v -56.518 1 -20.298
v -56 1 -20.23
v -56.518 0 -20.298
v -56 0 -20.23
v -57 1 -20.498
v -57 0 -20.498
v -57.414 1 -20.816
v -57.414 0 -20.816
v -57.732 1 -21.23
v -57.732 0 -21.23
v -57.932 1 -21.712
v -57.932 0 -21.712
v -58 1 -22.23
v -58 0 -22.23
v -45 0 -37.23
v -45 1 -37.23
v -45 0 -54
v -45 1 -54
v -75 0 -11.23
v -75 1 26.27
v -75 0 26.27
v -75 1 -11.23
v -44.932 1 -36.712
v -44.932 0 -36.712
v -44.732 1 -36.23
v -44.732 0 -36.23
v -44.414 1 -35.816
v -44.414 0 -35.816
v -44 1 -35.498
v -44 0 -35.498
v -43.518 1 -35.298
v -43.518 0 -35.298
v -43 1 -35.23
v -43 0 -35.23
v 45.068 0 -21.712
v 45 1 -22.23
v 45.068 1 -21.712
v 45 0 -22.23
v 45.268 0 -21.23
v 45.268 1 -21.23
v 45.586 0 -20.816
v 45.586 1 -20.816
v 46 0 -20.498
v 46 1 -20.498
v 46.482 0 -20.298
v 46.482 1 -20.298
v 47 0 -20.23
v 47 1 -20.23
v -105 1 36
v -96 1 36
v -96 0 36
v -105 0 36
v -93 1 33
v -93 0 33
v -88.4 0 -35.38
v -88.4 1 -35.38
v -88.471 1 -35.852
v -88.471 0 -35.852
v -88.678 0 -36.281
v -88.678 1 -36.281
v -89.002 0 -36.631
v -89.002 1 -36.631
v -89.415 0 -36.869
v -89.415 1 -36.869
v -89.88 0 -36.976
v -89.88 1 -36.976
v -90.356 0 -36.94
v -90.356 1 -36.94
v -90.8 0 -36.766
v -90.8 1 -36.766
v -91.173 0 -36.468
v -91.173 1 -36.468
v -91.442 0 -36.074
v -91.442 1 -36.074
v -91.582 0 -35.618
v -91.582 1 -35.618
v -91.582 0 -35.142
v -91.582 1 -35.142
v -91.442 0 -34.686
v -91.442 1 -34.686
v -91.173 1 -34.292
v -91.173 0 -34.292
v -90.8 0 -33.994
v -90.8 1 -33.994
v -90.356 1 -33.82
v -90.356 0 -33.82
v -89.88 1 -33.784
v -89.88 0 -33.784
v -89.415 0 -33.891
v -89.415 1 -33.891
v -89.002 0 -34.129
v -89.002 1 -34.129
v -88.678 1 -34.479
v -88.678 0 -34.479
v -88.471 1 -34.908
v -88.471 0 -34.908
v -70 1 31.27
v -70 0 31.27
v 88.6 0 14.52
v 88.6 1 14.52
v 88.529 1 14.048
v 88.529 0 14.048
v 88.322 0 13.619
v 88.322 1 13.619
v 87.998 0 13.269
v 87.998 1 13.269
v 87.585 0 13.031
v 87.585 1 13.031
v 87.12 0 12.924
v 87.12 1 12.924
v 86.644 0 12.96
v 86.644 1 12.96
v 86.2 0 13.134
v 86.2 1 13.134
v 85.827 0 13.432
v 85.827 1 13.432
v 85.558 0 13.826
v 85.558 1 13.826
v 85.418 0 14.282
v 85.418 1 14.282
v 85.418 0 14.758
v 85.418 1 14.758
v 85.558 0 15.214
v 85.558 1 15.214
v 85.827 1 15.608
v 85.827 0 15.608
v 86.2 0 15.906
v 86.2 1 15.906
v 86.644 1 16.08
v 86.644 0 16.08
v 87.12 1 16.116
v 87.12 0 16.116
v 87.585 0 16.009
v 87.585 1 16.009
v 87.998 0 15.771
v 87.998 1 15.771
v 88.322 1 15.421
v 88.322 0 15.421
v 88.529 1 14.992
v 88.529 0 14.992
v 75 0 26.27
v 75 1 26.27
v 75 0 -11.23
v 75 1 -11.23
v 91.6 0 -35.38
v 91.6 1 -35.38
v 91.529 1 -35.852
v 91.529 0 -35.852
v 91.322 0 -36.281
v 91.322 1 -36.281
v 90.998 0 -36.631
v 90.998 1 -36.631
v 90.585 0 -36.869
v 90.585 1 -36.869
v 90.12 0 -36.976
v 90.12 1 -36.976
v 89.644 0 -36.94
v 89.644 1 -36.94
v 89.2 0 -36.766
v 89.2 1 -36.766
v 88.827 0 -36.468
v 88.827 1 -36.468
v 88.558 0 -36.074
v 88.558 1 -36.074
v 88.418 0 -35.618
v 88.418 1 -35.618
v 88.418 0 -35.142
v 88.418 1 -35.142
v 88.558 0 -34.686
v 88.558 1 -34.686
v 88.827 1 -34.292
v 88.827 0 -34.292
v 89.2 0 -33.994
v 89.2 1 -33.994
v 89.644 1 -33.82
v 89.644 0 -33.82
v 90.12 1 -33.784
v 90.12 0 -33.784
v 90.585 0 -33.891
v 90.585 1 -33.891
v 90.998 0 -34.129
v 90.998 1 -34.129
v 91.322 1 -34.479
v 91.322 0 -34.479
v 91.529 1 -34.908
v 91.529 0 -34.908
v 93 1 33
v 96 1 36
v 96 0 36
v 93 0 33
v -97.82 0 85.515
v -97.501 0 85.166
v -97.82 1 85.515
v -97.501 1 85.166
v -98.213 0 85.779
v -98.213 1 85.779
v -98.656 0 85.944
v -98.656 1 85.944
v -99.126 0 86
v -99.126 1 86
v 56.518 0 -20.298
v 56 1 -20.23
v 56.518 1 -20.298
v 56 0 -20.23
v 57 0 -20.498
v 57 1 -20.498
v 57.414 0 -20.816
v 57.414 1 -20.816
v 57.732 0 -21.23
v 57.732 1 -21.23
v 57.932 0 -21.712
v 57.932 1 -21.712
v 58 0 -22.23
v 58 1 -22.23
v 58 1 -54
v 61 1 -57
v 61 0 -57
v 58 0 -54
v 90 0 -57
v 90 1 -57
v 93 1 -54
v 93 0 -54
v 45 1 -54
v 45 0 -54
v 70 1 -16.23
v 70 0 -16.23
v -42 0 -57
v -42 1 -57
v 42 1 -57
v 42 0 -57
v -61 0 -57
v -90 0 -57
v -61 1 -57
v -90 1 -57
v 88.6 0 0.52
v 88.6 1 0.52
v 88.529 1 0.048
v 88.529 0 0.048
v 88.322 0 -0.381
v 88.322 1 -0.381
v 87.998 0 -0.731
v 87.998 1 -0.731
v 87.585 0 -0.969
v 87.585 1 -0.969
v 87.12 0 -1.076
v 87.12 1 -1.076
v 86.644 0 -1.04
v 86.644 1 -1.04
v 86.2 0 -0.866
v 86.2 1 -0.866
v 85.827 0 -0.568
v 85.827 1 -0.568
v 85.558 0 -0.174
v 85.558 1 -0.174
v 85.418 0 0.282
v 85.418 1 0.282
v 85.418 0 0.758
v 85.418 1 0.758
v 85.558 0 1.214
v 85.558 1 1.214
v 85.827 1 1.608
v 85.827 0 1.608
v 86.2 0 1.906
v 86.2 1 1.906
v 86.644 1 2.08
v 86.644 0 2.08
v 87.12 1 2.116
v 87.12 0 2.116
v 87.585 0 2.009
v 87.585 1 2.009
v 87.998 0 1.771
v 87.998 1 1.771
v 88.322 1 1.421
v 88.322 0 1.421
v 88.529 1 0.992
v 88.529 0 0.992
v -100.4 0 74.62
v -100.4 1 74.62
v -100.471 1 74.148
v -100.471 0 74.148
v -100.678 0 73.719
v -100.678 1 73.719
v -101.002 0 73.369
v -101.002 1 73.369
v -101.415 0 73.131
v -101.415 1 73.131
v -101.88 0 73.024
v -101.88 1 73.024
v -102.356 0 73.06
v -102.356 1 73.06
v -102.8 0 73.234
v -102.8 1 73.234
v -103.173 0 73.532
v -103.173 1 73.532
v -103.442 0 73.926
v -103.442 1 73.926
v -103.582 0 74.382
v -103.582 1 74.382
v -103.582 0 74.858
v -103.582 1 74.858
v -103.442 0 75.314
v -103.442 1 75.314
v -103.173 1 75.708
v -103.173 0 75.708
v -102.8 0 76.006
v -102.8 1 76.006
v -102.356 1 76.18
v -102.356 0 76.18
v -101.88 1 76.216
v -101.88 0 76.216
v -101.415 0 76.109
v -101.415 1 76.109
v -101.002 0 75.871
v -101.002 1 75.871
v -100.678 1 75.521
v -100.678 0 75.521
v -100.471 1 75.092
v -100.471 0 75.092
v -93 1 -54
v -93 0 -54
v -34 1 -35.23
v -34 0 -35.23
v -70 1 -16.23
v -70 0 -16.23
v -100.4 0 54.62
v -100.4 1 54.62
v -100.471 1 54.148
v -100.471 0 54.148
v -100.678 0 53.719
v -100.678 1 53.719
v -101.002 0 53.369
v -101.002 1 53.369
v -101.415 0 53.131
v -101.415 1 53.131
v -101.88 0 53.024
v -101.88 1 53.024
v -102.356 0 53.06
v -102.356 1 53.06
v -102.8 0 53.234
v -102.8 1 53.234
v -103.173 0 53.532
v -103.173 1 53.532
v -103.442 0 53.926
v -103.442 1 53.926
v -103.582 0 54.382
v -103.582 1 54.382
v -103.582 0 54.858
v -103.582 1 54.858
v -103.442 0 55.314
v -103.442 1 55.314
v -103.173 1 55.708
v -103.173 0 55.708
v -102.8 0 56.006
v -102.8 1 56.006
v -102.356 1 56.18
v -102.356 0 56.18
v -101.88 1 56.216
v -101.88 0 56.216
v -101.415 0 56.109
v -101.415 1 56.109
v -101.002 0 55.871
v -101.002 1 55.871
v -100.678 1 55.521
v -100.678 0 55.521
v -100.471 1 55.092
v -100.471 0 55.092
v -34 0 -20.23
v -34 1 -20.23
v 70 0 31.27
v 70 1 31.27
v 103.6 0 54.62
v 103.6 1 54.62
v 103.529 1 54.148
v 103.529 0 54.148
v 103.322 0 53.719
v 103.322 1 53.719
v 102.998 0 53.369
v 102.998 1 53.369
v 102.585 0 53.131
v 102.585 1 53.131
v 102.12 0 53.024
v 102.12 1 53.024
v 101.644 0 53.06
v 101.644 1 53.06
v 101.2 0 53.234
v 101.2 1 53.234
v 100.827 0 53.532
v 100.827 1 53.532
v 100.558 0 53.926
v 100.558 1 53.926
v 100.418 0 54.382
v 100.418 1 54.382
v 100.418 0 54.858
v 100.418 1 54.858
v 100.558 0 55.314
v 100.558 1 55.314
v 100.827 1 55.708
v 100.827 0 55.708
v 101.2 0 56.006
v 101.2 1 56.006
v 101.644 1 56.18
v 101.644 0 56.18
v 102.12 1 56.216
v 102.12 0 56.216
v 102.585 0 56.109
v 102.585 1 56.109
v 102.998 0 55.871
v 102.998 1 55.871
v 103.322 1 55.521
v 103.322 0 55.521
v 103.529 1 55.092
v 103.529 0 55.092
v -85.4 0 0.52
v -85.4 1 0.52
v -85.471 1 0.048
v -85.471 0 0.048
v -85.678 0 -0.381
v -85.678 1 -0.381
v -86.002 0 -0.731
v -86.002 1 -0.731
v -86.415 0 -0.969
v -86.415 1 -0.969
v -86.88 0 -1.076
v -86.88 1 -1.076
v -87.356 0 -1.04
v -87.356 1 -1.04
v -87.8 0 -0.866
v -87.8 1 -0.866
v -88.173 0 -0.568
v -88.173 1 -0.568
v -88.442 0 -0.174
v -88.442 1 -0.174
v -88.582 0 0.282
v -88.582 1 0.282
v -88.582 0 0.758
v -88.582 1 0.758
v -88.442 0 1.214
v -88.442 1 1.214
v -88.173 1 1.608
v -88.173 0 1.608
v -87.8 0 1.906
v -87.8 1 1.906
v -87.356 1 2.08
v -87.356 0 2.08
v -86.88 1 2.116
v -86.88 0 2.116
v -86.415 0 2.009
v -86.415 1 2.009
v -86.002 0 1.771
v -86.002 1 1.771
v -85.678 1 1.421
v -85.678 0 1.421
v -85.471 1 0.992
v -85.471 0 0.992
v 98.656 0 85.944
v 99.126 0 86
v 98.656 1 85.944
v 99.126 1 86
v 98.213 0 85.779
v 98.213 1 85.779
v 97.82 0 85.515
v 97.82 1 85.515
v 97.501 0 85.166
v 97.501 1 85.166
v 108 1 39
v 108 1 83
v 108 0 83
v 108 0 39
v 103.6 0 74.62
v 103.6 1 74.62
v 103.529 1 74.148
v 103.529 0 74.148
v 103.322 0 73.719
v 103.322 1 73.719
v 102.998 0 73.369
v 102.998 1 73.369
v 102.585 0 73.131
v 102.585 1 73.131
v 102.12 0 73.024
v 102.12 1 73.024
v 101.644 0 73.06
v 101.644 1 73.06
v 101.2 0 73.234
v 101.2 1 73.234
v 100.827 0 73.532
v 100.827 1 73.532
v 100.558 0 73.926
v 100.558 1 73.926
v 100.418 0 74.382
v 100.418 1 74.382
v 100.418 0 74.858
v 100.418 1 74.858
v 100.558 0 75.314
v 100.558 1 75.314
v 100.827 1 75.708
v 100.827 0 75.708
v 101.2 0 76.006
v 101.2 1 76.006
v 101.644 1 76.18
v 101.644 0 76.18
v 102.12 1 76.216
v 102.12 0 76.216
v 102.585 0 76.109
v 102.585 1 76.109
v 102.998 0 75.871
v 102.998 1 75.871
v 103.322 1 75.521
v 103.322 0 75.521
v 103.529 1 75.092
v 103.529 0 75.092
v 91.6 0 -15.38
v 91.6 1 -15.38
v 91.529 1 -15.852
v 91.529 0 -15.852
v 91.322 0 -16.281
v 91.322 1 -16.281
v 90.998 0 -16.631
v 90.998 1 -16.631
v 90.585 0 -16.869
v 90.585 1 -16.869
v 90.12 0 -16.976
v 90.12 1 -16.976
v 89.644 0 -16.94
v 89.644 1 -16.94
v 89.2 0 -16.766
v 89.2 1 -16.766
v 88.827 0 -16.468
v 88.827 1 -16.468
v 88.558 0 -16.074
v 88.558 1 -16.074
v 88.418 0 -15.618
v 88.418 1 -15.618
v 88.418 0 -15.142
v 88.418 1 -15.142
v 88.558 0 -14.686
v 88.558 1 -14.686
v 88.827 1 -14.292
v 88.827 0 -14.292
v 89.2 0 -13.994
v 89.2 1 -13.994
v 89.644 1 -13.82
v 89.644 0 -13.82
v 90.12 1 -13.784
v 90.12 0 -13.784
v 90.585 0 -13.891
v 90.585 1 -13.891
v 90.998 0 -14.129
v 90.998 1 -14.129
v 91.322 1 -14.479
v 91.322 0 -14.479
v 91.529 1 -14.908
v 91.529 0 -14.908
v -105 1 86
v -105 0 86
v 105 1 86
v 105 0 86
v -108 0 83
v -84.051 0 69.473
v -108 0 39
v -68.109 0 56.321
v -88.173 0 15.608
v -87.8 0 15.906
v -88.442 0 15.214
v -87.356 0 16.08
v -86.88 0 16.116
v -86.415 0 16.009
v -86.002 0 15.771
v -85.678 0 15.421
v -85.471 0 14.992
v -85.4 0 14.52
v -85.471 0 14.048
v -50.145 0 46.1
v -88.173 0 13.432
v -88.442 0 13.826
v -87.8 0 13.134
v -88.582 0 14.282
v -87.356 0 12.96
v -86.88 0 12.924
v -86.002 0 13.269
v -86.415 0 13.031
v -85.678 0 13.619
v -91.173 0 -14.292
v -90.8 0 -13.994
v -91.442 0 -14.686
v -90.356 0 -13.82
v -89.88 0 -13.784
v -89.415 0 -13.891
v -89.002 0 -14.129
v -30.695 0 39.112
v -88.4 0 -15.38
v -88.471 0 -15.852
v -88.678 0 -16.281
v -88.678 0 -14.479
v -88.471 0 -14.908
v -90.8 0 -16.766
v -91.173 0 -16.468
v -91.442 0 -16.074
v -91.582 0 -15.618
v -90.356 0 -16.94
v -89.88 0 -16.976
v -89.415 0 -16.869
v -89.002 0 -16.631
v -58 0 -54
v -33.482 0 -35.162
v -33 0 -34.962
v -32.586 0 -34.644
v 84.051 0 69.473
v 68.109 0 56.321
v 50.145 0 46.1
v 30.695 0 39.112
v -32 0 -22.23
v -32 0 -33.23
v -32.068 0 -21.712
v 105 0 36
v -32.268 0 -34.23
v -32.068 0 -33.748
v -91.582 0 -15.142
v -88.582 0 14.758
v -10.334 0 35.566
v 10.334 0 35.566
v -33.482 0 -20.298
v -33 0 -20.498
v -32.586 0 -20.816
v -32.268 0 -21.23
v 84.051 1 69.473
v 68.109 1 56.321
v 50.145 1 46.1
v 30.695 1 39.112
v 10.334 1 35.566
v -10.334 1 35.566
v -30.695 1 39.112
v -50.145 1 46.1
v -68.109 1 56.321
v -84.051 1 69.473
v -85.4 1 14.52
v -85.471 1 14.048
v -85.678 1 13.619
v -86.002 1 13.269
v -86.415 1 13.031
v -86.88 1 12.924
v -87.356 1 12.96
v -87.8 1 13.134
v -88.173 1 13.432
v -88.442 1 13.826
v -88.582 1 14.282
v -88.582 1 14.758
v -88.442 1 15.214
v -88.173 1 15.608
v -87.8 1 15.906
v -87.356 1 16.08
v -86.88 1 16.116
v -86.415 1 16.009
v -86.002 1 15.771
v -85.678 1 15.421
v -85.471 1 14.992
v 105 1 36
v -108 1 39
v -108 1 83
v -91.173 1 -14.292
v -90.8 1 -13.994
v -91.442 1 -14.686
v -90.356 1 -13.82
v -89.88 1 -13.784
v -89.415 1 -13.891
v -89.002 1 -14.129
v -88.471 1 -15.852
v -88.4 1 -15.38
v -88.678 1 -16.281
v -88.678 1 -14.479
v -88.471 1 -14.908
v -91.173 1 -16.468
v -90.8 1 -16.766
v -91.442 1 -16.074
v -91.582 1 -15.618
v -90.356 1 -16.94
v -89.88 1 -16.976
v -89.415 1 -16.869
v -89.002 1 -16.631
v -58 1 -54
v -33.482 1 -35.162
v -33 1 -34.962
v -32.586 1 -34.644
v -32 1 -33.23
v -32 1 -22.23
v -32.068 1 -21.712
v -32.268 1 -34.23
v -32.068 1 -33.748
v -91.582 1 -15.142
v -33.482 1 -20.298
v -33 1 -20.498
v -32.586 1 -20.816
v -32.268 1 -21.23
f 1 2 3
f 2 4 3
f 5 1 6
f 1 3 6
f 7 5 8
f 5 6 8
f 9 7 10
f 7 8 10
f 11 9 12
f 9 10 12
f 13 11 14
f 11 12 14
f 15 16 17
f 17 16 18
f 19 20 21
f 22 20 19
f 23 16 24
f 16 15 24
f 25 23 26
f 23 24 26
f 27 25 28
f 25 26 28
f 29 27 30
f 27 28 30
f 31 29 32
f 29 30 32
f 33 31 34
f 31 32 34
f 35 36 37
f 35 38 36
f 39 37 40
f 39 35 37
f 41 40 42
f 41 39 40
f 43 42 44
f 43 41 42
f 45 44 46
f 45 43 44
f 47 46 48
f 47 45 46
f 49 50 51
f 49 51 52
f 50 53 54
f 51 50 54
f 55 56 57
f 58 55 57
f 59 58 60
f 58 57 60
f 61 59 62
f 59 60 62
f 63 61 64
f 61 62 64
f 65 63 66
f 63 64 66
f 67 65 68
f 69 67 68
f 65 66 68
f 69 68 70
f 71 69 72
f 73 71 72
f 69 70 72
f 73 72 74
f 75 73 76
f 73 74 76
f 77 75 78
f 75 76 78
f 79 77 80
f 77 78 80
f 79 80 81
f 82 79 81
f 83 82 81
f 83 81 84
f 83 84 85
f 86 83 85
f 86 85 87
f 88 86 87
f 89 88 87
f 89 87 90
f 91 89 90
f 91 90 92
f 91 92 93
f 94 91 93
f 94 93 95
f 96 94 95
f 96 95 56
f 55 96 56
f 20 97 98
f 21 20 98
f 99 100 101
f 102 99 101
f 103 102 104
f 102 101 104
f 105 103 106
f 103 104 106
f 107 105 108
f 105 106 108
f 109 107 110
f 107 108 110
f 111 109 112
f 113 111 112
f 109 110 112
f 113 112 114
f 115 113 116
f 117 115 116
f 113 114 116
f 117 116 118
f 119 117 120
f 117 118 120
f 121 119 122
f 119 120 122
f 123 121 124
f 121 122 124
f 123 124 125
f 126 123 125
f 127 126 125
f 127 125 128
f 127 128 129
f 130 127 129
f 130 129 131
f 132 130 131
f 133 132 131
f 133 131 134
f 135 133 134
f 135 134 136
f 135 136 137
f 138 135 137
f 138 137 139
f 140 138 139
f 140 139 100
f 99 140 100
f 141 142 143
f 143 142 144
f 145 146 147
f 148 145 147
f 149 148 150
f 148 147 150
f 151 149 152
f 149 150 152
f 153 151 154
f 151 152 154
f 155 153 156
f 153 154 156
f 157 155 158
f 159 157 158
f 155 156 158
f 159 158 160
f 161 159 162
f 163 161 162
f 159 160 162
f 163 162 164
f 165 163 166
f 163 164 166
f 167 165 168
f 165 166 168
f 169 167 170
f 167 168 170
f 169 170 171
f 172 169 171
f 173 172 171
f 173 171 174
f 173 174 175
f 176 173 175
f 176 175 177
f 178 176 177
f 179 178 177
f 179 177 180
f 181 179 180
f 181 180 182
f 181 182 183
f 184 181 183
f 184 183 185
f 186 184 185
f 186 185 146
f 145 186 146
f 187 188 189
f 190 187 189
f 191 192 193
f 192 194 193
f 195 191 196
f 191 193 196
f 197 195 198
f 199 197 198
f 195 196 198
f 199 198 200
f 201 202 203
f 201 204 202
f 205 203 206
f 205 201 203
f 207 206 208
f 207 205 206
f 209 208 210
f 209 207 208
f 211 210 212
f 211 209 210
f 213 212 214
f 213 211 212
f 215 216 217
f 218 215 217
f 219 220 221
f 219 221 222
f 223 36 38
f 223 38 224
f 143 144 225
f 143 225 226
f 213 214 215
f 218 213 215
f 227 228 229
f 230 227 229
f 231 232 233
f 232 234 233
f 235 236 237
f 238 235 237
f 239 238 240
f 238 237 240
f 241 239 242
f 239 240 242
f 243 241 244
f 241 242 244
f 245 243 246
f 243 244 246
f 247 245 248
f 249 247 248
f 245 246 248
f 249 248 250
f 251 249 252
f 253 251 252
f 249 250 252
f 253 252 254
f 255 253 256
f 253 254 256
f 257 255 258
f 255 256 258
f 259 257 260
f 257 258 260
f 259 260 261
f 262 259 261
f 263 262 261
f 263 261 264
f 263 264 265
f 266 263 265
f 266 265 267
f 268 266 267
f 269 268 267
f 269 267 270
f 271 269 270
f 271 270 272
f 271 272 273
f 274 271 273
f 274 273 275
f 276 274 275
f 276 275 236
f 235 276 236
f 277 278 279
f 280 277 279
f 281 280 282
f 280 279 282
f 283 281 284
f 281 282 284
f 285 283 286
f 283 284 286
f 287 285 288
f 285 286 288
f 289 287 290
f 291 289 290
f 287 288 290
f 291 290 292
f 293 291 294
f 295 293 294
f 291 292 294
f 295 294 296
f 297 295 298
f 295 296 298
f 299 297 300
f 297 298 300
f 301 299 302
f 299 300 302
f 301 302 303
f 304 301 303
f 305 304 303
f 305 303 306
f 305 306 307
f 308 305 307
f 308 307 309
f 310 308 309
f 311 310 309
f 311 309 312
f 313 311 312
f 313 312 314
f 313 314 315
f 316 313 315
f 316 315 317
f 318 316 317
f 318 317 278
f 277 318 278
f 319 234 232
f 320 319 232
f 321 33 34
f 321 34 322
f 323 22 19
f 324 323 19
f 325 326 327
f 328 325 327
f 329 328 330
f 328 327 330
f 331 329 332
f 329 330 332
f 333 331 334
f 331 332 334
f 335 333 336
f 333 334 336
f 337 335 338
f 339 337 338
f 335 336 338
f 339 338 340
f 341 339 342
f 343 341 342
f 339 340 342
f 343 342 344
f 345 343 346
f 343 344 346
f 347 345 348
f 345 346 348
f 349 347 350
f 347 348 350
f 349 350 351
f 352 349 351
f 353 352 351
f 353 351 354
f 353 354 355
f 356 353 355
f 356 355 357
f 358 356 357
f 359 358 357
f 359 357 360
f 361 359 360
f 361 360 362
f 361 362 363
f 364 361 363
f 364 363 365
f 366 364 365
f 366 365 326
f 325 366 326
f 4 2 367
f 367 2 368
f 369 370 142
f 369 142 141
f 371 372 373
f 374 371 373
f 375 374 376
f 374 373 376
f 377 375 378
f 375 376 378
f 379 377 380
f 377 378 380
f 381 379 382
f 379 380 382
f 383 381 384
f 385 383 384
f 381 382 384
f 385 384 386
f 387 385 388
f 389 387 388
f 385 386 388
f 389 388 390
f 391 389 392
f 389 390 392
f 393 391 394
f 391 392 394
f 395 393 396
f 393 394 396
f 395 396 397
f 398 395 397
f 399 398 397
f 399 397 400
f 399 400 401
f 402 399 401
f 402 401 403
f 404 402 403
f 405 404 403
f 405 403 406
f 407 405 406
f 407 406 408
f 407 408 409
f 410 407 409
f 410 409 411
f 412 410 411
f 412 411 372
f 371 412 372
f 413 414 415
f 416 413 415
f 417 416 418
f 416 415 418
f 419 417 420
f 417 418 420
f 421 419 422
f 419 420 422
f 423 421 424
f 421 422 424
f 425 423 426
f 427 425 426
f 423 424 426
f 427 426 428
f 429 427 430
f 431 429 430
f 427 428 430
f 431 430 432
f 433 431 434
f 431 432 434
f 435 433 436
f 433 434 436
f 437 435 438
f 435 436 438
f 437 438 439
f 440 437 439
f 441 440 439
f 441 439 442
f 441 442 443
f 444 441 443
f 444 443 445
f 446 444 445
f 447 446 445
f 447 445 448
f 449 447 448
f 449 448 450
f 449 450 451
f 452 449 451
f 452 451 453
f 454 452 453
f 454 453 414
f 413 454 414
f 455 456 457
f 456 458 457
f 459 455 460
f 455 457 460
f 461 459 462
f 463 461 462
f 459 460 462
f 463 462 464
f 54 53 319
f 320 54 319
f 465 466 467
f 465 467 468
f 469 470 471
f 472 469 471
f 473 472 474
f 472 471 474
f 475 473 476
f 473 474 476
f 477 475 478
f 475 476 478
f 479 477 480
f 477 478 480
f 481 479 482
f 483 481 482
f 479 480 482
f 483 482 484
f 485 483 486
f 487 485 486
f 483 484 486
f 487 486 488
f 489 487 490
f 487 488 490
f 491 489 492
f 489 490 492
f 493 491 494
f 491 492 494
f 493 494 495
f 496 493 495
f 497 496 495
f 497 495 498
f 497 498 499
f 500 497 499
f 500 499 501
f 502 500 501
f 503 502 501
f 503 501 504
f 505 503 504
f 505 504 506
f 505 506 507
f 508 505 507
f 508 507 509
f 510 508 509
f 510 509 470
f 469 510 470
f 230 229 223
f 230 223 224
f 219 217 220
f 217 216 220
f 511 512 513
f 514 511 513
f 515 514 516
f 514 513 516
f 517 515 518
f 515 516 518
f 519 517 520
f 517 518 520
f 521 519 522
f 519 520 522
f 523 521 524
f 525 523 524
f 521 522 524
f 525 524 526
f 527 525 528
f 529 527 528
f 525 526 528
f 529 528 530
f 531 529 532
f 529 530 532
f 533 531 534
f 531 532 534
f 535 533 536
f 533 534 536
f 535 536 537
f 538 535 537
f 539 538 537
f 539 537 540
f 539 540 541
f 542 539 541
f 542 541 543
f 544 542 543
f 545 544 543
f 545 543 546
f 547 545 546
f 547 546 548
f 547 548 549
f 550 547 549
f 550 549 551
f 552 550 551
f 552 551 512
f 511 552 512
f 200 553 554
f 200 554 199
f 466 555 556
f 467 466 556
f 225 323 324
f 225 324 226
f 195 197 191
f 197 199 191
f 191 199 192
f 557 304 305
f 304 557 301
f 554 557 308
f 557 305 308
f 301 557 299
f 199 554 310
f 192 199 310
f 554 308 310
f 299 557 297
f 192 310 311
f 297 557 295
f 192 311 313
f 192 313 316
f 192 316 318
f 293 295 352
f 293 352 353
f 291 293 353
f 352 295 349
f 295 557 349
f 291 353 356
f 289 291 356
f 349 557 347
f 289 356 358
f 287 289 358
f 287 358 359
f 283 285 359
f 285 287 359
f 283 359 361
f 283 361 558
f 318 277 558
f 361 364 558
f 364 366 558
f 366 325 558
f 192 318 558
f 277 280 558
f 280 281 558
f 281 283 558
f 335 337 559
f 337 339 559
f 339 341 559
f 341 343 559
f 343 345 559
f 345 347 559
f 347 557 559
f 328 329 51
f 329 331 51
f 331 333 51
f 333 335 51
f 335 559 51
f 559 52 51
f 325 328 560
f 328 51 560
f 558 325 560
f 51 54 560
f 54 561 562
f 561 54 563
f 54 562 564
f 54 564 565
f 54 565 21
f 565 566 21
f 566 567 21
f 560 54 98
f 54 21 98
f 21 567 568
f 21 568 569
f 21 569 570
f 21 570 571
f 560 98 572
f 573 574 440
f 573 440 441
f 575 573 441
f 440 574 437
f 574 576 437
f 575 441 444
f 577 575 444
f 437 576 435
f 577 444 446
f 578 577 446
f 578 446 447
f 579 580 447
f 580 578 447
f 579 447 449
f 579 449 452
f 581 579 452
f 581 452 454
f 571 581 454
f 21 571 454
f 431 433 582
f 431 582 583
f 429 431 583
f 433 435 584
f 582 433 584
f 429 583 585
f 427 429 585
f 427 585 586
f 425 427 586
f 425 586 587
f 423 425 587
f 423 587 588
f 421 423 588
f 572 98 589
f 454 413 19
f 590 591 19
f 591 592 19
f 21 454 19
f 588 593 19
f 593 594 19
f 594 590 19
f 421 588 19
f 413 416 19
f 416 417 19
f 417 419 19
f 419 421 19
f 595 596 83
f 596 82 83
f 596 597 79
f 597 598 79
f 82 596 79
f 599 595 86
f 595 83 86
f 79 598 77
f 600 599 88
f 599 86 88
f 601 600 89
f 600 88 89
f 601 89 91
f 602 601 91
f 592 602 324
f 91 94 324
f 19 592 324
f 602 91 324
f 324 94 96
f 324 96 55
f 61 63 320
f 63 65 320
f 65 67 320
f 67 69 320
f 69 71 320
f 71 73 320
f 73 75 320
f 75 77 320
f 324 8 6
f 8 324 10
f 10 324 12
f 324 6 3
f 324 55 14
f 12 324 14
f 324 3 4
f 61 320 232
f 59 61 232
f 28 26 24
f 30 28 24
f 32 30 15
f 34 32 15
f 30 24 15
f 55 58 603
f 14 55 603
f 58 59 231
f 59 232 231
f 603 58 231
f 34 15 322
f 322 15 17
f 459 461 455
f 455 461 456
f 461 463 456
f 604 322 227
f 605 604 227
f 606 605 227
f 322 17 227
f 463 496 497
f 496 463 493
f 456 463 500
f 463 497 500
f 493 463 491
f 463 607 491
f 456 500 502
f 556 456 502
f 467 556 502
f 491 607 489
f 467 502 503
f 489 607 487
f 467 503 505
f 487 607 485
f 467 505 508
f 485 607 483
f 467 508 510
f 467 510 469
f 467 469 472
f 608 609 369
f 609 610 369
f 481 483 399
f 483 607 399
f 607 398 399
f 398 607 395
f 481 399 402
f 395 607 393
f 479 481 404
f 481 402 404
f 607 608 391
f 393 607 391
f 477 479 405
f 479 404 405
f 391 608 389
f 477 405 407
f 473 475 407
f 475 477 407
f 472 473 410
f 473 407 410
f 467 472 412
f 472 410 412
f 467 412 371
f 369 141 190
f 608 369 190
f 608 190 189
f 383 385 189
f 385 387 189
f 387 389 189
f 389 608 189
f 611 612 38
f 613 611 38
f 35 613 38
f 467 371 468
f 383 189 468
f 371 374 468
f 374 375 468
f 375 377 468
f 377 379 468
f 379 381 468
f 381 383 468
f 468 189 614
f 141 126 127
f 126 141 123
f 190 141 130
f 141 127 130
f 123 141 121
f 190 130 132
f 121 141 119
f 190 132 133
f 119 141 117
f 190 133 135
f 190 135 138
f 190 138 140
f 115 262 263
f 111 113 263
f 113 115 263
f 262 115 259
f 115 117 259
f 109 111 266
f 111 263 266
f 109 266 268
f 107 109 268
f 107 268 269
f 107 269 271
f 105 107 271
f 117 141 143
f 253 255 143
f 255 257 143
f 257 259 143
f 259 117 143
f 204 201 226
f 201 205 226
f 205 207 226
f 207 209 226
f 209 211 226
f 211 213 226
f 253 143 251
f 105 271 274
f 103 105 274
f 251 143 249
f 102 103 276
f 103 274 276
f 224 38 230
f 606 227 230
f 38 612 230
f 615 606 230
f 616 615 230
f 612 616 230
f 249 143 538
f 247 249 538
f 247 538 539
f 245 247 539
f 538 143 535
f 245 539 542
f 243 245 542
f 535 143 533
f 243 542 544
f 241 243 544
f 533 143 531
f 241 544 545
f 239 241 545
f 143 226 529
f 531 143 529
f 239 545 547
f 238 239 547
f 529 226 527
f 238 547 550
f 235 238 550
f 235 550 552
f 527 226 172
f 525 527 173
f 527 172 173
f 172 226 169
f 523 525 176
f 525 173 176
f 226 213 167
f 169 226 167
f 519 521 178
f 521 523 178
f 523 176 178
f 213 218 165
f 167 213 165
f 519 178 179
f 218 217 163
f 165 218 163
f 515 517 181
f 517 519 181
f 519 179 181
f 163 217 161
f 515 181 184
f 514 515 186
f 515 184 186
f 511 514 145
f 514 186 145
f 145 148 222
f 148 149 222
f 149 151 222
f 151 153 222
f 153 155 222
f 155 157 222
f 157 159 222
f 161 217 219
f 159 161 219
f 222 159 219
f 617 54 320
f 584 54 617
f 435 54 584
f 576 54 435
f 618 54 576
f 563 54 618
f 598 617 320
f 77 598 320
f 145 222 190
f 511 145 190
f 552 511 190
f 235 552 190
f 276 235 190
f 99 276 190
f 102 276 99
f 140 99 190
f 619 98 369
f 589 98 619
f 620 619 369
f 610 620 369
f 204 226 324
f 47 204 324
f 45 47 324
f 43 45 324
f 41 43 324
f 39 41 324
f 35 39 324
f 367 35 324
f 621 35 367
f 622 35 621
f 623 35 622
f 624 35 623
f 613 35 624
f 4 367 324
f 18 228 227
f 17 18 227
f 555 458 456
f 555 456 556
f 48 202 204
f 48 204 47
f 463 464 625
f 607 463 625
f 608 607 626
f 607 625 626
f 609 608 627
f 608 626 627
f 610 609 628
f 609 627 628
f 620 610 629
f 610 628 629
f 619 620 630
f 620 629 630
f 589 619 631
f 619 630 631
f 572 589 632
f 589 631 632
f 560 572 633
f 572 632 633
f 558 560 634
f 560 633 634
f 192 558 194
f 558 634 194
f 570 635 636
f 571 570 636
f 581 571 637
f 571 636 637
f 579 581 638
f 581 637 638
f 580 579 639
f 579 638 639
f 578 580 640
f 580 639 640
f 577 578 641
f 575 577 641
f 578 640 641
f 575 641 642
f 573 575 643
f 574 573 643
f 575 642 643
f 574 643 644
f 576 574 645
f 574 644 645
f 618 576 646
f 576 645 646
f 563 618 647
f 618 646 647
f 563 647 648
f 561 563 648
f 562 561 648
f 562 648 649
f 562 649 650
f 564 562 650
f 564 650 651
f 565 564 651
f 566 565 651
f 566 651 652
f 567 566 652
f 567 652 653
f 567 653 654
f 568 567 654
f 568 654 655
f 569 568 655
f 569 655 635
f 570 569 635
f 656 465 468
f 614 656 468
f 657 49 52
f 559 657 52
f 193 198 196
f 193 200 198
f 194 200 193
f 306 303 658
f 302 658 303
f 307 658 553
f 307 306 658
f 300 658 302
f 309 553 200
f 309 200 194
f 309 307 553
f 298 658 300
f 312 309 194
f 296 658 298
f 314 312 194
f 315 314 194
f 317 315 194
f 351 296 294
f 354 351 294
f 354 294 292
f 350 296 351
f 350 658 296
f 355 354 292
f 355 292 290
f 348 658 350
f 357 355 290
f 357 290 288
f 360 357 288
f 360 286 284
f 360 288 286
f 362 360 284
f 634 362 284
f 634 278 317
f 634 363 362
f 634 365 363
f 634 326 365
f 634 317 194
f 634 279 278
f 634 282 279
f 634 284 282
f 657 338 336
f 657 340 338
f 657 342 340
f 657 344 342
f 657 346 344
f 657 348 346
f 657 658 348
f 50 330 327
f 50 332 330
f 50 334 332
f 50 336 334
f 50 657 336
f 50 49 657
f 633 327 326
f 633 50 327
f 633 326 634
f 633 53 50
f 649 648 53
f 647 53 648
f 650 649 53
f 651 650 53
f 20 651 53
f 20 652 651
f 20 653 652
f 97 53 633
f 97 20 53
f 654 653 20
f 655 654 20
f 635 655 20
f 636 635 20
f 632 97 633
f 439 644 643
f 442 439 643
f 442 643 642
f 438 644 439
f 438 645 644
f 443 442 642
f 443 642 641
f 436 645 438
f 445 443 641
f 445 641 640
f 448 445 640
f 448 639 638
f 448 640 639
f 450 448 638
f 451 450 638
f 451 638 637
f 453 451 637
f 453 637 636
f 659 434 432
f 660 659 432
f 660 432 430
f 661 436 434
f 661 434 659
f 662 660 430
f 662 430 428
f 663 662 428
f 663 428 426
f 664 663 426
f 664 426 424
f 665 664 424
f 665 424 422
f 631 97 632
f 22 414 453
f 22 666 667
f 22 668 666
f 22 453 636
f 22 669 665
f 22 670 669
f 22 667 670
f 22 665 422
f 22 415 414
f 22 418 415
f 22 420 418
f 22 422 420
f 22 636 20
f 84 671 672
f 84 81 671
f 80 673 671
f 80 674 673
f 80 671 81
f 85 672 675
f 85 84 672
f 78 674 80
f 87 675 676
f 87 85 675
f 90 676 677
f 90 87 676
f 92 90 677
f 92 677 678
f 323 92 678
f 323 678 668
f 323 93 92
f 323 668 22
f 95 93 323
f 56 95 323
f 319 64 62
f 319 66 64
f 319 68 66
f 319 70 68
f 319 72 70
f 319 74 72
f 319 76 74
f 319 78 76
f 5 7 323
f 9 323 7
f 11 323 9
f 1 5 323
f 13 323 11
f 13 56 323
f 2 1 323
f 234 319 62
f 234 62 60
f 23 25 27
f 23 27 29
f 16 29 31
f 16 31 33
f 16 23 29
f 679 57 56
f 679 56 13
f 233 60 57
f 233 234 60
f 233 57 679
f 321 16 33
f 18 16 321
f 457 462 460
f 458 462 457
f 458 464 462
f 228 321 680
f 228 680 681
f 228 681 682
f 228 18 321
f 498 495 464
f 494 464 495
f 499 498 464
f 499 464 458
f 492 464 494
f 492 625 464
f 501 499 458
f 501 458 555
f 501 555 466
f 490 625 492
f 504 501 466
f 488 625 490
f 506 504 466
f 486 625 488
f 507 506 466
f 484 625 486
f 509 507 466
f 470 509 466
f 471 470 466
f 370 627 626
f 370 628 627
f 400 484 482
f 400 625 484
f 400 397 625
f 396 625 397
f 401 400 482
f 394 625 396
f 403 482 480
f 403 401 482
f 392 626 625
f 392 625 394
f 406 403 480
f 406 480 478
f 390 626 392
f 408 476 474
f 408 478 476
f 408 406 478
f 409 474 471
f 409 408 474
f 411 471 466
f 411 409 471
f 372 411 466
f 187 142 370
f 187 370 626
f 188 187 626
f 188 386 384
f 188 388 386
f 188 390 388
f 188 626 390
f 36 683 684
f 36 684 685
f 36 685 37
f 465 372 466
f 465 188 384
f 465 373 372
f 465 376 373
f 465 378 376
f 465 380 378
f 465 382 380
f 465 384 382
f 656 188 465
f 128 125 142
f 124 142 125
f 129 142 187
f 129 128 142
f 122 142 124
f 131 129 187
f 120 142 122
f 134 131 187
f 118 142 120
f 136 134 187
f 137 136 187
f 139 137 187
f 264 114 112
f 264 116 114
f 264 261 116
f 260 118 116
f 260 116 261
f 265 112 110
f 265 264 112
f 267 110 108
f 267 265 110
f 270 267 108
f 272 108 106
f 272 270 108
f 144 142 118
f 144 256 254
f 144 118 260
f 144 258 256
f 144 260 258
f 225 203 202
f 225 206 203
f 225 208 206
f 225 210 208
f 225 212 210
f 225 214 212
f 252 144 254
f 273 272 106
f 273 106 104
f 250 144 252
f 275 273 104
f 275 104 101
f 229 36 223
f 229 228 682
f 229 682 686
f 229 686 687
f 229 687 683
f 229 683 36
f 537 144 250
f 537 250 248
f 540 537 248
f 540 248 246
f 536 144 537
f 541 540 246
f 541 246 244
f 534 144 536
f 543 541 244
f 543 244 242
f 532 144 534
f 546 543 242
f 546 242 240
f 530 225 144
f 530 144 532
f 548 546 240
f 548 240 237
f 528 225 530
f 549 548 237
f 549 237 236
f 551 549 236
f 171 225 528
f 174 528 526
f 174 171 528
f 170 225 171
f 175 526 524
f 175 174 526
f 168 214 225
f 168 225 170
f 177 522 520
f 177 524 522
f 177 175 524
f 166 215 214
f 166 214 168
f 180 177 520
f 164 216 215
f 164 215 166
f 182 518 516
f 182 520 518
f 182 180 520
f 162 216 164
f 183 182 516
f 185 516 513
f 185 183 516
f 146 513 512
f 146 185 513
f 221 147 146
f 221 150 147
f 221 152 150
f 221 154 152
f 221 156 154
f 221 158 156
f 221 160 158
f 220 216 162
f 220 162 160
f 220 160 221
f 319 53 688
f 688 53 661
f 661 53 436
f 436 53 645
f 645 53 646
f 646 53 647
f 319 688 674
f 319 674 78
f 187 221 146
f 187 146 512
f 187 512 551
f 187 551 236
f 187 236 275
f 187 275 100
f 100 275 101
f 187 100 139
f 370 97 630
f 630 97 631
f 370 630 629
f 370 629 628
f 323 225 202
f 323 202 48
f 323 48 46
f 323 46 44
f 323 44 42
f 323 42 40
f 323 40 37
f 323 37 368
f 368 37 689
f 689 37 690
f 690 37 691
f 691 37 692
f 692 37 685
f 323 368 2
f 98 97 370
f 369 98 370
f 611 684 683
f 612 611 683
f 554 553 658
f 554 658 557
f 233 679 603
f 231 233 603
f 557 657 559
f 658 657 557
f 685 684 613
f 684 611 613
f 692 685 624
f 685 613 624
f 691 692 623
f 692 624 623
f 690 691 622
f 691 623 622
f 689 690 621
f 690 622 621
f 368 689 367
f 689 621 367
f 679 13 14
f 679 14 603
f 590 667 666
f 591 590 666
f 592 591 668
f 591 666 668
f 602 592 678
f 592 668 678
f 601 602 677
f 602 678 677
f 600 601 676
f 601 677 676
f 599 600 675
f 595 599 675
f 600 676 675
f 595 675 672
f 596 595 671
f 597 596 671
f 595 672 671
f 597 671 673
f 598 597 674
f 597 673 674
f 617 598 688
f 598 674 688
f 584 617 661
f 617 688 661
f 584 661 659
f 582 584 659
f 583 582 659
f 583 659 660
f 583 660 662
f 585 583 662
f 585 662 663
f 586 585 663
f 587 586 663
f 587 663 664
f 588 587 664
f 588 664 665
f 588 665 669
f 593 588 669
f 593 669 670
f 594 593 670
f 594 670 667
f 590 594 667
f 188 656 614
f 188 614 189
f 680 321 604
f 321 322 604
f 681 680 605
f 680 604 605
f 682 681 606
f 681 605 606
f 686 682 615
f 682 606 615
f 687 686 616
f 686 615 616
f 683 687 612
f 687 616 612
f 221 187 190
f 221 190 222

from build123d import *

# Parameters (mm, degrees)
SKETCH_1_W               = 186
SKETCH_1_H               = 110
EXTRUDE_1_DEPTH          = 1
SKETCH_2_R               = 1.6
CUT_EXTRUDE_1_DEPTH      = 2
EXTRUDE_2_DEPTH          = 1
SKETCH_6_R               = 120
CUT_EXTRUDE_2_DEPTH      = 2
SKETCH_8_W               = 186
SKETCH_8_H               = 2
EXTRUDE_3_DEPTH          = 1
SKETCH_7_R               = 1.25
SKETCH_7_R_2             = 1.6
CUT_EXTRUDE_3_DEPTH      = 2
CUT_EXTRUDE_4_DEPTH      = 2
SKETCH_10_W              = 8
SKETCH_10_H              = 15
CUT_EXTRUDE_5_DEPTH      = 2
SKETCH_11_W              = 150
SKETCH_11_H              = 47.5
CUT_EXTRUDE_6_DEPTH      = 2
CHAMFER_2_SIZE           = 5
SKETCH_12_R              = 1.6
CUT_EXTRUDE_7_DEPTH      = 2
SKETCH_14_W              = 3
SKETCH_14_H              = 36.77
CUT_EXTRUDE_8_DEPTH      = 1
CUT_EXTRUDE_8_DEPTH_BACK = 2
SKETCH_15_W              = 5
SKETCH_15_H              = 36.77
EXTRUDE_4_DEPTH          = 1
SKETCH_16_W              = 6
SKETCH_16_H              = 15
CUT_EXTRUDE_9_DEPTH      = 2
CHAMFER_1_SIZE           = 3
FILLET_1_R               = 2


with BuildPart() as part:
    # 草图1 → 凸台-拉伸1 (new body)
    with BuildSketch(Plane(origin=(0, 0, 0), x_dir=(1, 0, 0), z_dir=(0, 1, 0))):
        Rectangle(SKETCH_1_W, SKETCH_1_H)
    extrude(amount=EXTRUDE_1_DEPTH)

    # 草图2 → 切除-拉伸1 (cut, through all)
    with BuildSketch(Plane(origin=(0, 1, 0), x_dir=(1, 0, 0), z_dir=(0, 1, 0))):
        with Locations((90, 15.38)):
            Circle(SKETCH_2_R)
        with Locations((90, 35.38)):
            Circle(SKETCH_2_R)
        with Locations((-90, 35.38)):
            Circle(SKETCH_2_R)
        with Locations((-90, 15.38)):
            Circle(SKETCH_2_R)
    extrude(amount=-CUT_EXTRUDE_1_DEPTH, mode=Mode.SUBTRACT)

    # 草图5 → 凸台-拉伸2 (add)
    with BuildSketch(Plane(origin=(0, 1, 0), x_dir=(1, 0, 0), z_dir=(0, 1, 0))):
        Polygon((-108, -86), (108, -86), (108, -36), (93, -36), (93, -55), (-93, -55), (-93, -36), (-108, -36), align=None)
    extrude(amount=-EXTRUDE_2_DEPTH)

    # 草图6 → 切除-拉伸2 (cut, through all)
    with BuildSketch(Plane(origin=(0, 1, 0), x_dir=(1, 0, 0), z_dir=(0, 1, 0))):
        with Locations((0, -155.12)):
            Circle(SKETCH_6_R)
    extrude(amount=-CUT_EXTRUDE_2_DEPTH, mode=Mode.SUBTRACT)

    # 草图8 → 凸台-拉伸3 (add)
    with BuildSketch(Plane(origin=(0, 1, 0), x_dir=(1, 0, 0), z_dir=(0, 1, 0))):
        with Locations((0, 56)):
            Rectangle(SKETCH_8_W, SKETCH_8_H)
    extrude(amount=-EXTRUDE_3_DEPTH)

    # 草图7 → 切除-拉伸3 (cut, through all)
    with BuildSketch(Plane(origin=(0, 1, 0), x_dir=(1, 0, 0), z_dir=(0, 1, 0))):
        with Locations((47.5, 46.38)):
            Circle(SKETCH_7_R)
        with Locations((47.5, 53.88)):
            Circle(SKETCH_7_R)
        with Locations((102, -74.62)):
            Circle(SKETCH_7_R_2)
        with Locations((102, -54.62)):
            Circle(SKETCH_7_R_2)
        with Locations((-102, -54.62)):
            Circle(SKETCH_7_R_2)
        with Locations((-102, -74.62)):
            Circle(SKETCH_7_R_2)
        with Locations((-47.5, 53.88)):
            Circle(SKETCH_7_R)
        with Locations((-47.5, 46.38)):
            Circle(SKETCH_7_R)
    extrude(amount=-CUT_EXTRUDE_3_DEPTH, mode=Mode.SUBTRACT)

    # 草图9 → 切除-拉伸4 (cut, through all)
    with BuildSketch(Plane(origin=(0, 1, 0), x_dir=(1, 0, 0), z_dir=(0, 1, 0))):
        with BuildLine():
            Line((55, 52.23), (55, 20.23))
            Line((55, 20.23), (40, 20.23))
            Line((40, 20.23), (40, 52.23))
            Line((40, 52.23), (40, 66.764572681))
            ThreePointArc((40, 66.764572681), (40.878679656, 68.885893025), (43, 69.764572681))
            Line((43, 69.764572681), (52, 69.764572681))
            ThreePointArc((52, 69.764572681), (54.121320344, 68.885893025), (55, 66.764572681))
            Line((55, 66.764572681), (55, 52.23))
        make_face()
        with BuildLine():
            Line((-40, 66.764572681), (-40, 52.23))
            Line((-40, 52.23), (-40, 20.23))
            Line((-40, 20.23), (-55, 20.23))
            Line((-55, 20.23), (-55, 52.23))
            Line((-55, 52.23), (-55, 66.764572681))
            ThreePointArc((-55, 66.764572681), (-54.121320344, 68.885893025), (-52, 69.764572681))
            Line((-52, 69.764572681), (-43, 69.764572681))
            ThreePointArc((-43, 69.764572681), (-40.878679656, 68.885893025), (-40, 66.764572681))
        make_face()
    extrude(amount=-CUT_EXTRUDE_4_DEPTH, mode=Mode.SUBTRACT)

    # 草图10 → 切除-拉伸5 (cut, through all)
    with BuildSketch(Plane(origin=(0, 1, 0), x_dir=(1, 0, 0), z_dir=(0, 1, 0))):
        with Locations((-36, 27.73)):
            Rectangle(SKETCH_10_W, SKETCH_10_H)
    extrude(amount=-CUT_EXTRUDE_5_DEPTH, mode=Mode.SUBTRACT)

    # 草图11 → 切除-拉伸6 (cut, through all)
    with BuildSketch(Plane(origin=(0, 1, 0), x_dir=(1, 0, 0), z_dir=(0, 1, 0))):
        with Locations((0, -7.52)):
            Rectangle(SKETCH_11_W, SKETCH_11_H)
    extrude(amount=-CUT_EXTRUDE_6_DEPTH, mode=Mode.SUBTRACT)

    # 倒角2
    chamfer_2_edges = [part.edges().sort_by_distance(p)[0] for p in [
        (75, 0.5, -16.23),
        (75, 0.5, 31.27),
        (-75, 0.5, 31.27),
        (-75, 0.5, -16.23),
    ]]
    chamfer(chamfer_2_edges, length=CHAMFER_2_SIZE)

    # 草图12 → 切除-拉伸7 (cut, through all)
    with BuildSketch(Plane(origin=(0, 1, 0), x_dir=(1, 0, 0), z_dir=(0, 1, 0))):
        with Locations((-87, -0.52)):
            Circle(SKETCH_12_R)
        with Locations((-87, -14.52)):
            Circle(SKETCH_12_R)
        with Locations((87, -14.52)):
            Circle(SKETCH_12_R)
        with Locations((87, -0.52)):
            Circle(SKETCH_12_R)
    extrude(amount=-CUT_EXTRUDE_7_DEPTH, mode=Mode.SUBTRACT)

    # 草图14 → 切除-拉伸8 (cut, two sides)
    with BuildSketch(Plane(origin=(0, 1, 0), x_dir=(1, 0, 0), z_dir=(0, 1, 0))) as cut_extrude_8_sk:
        with Locations((-56.5, 38.615)):
            Rectangle(SKETCH_14_W, SKETCH_14_H)
        with Locations((56.5, 38.615)):
            Rectangle(SKETCH_14_W, SKETCH_14_H)
    extrude(amount=CUT_EXTRUDE_8_DEPTH, mode=Mode.SUBTRACT)
    extrude(cut_extrude_8_sk.sketch, amount=-CUT_EXTRUDE_8_DEPTH_BACK, mode=Mode.SUBTRACT)

    # 草图15 → 凸台-拉伸4 (add)
    with BuildSketch(Plane(origin=(0, 1, 0), x_dir=(1, 0, 0), z_dir=(0, 1, 0))):
        with Locations((42.5, 38.615)):
            Rectangle(SKETCH_15_W, SKETCH_15_H)
        with Locations((-42.5, 38.615)):
            Rectangle(SKETCH_15_W, SKETCH_15_H)
    extrude(amount=-EXTRUDE_4_DEPTH)

    # 草图16 → 切除-拉伸9 (cut, through all)
    with BuildSketch(Plane(origin=(0, 1, 0), x_dir=(1, 0, 0), z_dir=(0, 1, 0))):
        with Locations((-42, 27.73)):
            Rectangle(SKETCH_16_W, SKETCH_16_H)
    extrude(amount=-CUT_EXTRUDE_9_DEPTH, mode=Mode.SUBTRACT)

    # 倒角1
    chamfer_1_edges = [part.edges().sort_by_distance(p)[0] for p in [
        (-58, 0.5, -57),
        (58, 0.5, -57),
        (-45, 0.5, -57),
        (45, 0.5, -57),
        (-93, 0.5, 36),
        (93, 0.5, 36),
        (108, 0.5, 36),
        (108, 0.5, 86),
        (-108, 0.5, 86),
        (-108, 0.5, 36),
        (93, 0.5, -57),
        (-93, 0.5, -57),
    ]]
    chamfer(chamfer_1_edges, length=CHAMFER_1_SIZE)

    # 圆角1
    fillet_1_edges = [part.edges().sort_by_distance(p)[0] for p in [
        (-32, 0.5, -35.23),
        (-32, 0.5, -20.23),
        (-58, 0.5, -20.23),
        (58, 0.5, -20.23),
        (45, 0.5, -20.23),
        (-45, 0.5, -35.23),
        (-98.093963117, 0.5, 86),
        (98.093963117, 0.5, 86),
    ]]
    fillet(fillet_1_edges, radius=FILLET_1_R)


solid = part.part
